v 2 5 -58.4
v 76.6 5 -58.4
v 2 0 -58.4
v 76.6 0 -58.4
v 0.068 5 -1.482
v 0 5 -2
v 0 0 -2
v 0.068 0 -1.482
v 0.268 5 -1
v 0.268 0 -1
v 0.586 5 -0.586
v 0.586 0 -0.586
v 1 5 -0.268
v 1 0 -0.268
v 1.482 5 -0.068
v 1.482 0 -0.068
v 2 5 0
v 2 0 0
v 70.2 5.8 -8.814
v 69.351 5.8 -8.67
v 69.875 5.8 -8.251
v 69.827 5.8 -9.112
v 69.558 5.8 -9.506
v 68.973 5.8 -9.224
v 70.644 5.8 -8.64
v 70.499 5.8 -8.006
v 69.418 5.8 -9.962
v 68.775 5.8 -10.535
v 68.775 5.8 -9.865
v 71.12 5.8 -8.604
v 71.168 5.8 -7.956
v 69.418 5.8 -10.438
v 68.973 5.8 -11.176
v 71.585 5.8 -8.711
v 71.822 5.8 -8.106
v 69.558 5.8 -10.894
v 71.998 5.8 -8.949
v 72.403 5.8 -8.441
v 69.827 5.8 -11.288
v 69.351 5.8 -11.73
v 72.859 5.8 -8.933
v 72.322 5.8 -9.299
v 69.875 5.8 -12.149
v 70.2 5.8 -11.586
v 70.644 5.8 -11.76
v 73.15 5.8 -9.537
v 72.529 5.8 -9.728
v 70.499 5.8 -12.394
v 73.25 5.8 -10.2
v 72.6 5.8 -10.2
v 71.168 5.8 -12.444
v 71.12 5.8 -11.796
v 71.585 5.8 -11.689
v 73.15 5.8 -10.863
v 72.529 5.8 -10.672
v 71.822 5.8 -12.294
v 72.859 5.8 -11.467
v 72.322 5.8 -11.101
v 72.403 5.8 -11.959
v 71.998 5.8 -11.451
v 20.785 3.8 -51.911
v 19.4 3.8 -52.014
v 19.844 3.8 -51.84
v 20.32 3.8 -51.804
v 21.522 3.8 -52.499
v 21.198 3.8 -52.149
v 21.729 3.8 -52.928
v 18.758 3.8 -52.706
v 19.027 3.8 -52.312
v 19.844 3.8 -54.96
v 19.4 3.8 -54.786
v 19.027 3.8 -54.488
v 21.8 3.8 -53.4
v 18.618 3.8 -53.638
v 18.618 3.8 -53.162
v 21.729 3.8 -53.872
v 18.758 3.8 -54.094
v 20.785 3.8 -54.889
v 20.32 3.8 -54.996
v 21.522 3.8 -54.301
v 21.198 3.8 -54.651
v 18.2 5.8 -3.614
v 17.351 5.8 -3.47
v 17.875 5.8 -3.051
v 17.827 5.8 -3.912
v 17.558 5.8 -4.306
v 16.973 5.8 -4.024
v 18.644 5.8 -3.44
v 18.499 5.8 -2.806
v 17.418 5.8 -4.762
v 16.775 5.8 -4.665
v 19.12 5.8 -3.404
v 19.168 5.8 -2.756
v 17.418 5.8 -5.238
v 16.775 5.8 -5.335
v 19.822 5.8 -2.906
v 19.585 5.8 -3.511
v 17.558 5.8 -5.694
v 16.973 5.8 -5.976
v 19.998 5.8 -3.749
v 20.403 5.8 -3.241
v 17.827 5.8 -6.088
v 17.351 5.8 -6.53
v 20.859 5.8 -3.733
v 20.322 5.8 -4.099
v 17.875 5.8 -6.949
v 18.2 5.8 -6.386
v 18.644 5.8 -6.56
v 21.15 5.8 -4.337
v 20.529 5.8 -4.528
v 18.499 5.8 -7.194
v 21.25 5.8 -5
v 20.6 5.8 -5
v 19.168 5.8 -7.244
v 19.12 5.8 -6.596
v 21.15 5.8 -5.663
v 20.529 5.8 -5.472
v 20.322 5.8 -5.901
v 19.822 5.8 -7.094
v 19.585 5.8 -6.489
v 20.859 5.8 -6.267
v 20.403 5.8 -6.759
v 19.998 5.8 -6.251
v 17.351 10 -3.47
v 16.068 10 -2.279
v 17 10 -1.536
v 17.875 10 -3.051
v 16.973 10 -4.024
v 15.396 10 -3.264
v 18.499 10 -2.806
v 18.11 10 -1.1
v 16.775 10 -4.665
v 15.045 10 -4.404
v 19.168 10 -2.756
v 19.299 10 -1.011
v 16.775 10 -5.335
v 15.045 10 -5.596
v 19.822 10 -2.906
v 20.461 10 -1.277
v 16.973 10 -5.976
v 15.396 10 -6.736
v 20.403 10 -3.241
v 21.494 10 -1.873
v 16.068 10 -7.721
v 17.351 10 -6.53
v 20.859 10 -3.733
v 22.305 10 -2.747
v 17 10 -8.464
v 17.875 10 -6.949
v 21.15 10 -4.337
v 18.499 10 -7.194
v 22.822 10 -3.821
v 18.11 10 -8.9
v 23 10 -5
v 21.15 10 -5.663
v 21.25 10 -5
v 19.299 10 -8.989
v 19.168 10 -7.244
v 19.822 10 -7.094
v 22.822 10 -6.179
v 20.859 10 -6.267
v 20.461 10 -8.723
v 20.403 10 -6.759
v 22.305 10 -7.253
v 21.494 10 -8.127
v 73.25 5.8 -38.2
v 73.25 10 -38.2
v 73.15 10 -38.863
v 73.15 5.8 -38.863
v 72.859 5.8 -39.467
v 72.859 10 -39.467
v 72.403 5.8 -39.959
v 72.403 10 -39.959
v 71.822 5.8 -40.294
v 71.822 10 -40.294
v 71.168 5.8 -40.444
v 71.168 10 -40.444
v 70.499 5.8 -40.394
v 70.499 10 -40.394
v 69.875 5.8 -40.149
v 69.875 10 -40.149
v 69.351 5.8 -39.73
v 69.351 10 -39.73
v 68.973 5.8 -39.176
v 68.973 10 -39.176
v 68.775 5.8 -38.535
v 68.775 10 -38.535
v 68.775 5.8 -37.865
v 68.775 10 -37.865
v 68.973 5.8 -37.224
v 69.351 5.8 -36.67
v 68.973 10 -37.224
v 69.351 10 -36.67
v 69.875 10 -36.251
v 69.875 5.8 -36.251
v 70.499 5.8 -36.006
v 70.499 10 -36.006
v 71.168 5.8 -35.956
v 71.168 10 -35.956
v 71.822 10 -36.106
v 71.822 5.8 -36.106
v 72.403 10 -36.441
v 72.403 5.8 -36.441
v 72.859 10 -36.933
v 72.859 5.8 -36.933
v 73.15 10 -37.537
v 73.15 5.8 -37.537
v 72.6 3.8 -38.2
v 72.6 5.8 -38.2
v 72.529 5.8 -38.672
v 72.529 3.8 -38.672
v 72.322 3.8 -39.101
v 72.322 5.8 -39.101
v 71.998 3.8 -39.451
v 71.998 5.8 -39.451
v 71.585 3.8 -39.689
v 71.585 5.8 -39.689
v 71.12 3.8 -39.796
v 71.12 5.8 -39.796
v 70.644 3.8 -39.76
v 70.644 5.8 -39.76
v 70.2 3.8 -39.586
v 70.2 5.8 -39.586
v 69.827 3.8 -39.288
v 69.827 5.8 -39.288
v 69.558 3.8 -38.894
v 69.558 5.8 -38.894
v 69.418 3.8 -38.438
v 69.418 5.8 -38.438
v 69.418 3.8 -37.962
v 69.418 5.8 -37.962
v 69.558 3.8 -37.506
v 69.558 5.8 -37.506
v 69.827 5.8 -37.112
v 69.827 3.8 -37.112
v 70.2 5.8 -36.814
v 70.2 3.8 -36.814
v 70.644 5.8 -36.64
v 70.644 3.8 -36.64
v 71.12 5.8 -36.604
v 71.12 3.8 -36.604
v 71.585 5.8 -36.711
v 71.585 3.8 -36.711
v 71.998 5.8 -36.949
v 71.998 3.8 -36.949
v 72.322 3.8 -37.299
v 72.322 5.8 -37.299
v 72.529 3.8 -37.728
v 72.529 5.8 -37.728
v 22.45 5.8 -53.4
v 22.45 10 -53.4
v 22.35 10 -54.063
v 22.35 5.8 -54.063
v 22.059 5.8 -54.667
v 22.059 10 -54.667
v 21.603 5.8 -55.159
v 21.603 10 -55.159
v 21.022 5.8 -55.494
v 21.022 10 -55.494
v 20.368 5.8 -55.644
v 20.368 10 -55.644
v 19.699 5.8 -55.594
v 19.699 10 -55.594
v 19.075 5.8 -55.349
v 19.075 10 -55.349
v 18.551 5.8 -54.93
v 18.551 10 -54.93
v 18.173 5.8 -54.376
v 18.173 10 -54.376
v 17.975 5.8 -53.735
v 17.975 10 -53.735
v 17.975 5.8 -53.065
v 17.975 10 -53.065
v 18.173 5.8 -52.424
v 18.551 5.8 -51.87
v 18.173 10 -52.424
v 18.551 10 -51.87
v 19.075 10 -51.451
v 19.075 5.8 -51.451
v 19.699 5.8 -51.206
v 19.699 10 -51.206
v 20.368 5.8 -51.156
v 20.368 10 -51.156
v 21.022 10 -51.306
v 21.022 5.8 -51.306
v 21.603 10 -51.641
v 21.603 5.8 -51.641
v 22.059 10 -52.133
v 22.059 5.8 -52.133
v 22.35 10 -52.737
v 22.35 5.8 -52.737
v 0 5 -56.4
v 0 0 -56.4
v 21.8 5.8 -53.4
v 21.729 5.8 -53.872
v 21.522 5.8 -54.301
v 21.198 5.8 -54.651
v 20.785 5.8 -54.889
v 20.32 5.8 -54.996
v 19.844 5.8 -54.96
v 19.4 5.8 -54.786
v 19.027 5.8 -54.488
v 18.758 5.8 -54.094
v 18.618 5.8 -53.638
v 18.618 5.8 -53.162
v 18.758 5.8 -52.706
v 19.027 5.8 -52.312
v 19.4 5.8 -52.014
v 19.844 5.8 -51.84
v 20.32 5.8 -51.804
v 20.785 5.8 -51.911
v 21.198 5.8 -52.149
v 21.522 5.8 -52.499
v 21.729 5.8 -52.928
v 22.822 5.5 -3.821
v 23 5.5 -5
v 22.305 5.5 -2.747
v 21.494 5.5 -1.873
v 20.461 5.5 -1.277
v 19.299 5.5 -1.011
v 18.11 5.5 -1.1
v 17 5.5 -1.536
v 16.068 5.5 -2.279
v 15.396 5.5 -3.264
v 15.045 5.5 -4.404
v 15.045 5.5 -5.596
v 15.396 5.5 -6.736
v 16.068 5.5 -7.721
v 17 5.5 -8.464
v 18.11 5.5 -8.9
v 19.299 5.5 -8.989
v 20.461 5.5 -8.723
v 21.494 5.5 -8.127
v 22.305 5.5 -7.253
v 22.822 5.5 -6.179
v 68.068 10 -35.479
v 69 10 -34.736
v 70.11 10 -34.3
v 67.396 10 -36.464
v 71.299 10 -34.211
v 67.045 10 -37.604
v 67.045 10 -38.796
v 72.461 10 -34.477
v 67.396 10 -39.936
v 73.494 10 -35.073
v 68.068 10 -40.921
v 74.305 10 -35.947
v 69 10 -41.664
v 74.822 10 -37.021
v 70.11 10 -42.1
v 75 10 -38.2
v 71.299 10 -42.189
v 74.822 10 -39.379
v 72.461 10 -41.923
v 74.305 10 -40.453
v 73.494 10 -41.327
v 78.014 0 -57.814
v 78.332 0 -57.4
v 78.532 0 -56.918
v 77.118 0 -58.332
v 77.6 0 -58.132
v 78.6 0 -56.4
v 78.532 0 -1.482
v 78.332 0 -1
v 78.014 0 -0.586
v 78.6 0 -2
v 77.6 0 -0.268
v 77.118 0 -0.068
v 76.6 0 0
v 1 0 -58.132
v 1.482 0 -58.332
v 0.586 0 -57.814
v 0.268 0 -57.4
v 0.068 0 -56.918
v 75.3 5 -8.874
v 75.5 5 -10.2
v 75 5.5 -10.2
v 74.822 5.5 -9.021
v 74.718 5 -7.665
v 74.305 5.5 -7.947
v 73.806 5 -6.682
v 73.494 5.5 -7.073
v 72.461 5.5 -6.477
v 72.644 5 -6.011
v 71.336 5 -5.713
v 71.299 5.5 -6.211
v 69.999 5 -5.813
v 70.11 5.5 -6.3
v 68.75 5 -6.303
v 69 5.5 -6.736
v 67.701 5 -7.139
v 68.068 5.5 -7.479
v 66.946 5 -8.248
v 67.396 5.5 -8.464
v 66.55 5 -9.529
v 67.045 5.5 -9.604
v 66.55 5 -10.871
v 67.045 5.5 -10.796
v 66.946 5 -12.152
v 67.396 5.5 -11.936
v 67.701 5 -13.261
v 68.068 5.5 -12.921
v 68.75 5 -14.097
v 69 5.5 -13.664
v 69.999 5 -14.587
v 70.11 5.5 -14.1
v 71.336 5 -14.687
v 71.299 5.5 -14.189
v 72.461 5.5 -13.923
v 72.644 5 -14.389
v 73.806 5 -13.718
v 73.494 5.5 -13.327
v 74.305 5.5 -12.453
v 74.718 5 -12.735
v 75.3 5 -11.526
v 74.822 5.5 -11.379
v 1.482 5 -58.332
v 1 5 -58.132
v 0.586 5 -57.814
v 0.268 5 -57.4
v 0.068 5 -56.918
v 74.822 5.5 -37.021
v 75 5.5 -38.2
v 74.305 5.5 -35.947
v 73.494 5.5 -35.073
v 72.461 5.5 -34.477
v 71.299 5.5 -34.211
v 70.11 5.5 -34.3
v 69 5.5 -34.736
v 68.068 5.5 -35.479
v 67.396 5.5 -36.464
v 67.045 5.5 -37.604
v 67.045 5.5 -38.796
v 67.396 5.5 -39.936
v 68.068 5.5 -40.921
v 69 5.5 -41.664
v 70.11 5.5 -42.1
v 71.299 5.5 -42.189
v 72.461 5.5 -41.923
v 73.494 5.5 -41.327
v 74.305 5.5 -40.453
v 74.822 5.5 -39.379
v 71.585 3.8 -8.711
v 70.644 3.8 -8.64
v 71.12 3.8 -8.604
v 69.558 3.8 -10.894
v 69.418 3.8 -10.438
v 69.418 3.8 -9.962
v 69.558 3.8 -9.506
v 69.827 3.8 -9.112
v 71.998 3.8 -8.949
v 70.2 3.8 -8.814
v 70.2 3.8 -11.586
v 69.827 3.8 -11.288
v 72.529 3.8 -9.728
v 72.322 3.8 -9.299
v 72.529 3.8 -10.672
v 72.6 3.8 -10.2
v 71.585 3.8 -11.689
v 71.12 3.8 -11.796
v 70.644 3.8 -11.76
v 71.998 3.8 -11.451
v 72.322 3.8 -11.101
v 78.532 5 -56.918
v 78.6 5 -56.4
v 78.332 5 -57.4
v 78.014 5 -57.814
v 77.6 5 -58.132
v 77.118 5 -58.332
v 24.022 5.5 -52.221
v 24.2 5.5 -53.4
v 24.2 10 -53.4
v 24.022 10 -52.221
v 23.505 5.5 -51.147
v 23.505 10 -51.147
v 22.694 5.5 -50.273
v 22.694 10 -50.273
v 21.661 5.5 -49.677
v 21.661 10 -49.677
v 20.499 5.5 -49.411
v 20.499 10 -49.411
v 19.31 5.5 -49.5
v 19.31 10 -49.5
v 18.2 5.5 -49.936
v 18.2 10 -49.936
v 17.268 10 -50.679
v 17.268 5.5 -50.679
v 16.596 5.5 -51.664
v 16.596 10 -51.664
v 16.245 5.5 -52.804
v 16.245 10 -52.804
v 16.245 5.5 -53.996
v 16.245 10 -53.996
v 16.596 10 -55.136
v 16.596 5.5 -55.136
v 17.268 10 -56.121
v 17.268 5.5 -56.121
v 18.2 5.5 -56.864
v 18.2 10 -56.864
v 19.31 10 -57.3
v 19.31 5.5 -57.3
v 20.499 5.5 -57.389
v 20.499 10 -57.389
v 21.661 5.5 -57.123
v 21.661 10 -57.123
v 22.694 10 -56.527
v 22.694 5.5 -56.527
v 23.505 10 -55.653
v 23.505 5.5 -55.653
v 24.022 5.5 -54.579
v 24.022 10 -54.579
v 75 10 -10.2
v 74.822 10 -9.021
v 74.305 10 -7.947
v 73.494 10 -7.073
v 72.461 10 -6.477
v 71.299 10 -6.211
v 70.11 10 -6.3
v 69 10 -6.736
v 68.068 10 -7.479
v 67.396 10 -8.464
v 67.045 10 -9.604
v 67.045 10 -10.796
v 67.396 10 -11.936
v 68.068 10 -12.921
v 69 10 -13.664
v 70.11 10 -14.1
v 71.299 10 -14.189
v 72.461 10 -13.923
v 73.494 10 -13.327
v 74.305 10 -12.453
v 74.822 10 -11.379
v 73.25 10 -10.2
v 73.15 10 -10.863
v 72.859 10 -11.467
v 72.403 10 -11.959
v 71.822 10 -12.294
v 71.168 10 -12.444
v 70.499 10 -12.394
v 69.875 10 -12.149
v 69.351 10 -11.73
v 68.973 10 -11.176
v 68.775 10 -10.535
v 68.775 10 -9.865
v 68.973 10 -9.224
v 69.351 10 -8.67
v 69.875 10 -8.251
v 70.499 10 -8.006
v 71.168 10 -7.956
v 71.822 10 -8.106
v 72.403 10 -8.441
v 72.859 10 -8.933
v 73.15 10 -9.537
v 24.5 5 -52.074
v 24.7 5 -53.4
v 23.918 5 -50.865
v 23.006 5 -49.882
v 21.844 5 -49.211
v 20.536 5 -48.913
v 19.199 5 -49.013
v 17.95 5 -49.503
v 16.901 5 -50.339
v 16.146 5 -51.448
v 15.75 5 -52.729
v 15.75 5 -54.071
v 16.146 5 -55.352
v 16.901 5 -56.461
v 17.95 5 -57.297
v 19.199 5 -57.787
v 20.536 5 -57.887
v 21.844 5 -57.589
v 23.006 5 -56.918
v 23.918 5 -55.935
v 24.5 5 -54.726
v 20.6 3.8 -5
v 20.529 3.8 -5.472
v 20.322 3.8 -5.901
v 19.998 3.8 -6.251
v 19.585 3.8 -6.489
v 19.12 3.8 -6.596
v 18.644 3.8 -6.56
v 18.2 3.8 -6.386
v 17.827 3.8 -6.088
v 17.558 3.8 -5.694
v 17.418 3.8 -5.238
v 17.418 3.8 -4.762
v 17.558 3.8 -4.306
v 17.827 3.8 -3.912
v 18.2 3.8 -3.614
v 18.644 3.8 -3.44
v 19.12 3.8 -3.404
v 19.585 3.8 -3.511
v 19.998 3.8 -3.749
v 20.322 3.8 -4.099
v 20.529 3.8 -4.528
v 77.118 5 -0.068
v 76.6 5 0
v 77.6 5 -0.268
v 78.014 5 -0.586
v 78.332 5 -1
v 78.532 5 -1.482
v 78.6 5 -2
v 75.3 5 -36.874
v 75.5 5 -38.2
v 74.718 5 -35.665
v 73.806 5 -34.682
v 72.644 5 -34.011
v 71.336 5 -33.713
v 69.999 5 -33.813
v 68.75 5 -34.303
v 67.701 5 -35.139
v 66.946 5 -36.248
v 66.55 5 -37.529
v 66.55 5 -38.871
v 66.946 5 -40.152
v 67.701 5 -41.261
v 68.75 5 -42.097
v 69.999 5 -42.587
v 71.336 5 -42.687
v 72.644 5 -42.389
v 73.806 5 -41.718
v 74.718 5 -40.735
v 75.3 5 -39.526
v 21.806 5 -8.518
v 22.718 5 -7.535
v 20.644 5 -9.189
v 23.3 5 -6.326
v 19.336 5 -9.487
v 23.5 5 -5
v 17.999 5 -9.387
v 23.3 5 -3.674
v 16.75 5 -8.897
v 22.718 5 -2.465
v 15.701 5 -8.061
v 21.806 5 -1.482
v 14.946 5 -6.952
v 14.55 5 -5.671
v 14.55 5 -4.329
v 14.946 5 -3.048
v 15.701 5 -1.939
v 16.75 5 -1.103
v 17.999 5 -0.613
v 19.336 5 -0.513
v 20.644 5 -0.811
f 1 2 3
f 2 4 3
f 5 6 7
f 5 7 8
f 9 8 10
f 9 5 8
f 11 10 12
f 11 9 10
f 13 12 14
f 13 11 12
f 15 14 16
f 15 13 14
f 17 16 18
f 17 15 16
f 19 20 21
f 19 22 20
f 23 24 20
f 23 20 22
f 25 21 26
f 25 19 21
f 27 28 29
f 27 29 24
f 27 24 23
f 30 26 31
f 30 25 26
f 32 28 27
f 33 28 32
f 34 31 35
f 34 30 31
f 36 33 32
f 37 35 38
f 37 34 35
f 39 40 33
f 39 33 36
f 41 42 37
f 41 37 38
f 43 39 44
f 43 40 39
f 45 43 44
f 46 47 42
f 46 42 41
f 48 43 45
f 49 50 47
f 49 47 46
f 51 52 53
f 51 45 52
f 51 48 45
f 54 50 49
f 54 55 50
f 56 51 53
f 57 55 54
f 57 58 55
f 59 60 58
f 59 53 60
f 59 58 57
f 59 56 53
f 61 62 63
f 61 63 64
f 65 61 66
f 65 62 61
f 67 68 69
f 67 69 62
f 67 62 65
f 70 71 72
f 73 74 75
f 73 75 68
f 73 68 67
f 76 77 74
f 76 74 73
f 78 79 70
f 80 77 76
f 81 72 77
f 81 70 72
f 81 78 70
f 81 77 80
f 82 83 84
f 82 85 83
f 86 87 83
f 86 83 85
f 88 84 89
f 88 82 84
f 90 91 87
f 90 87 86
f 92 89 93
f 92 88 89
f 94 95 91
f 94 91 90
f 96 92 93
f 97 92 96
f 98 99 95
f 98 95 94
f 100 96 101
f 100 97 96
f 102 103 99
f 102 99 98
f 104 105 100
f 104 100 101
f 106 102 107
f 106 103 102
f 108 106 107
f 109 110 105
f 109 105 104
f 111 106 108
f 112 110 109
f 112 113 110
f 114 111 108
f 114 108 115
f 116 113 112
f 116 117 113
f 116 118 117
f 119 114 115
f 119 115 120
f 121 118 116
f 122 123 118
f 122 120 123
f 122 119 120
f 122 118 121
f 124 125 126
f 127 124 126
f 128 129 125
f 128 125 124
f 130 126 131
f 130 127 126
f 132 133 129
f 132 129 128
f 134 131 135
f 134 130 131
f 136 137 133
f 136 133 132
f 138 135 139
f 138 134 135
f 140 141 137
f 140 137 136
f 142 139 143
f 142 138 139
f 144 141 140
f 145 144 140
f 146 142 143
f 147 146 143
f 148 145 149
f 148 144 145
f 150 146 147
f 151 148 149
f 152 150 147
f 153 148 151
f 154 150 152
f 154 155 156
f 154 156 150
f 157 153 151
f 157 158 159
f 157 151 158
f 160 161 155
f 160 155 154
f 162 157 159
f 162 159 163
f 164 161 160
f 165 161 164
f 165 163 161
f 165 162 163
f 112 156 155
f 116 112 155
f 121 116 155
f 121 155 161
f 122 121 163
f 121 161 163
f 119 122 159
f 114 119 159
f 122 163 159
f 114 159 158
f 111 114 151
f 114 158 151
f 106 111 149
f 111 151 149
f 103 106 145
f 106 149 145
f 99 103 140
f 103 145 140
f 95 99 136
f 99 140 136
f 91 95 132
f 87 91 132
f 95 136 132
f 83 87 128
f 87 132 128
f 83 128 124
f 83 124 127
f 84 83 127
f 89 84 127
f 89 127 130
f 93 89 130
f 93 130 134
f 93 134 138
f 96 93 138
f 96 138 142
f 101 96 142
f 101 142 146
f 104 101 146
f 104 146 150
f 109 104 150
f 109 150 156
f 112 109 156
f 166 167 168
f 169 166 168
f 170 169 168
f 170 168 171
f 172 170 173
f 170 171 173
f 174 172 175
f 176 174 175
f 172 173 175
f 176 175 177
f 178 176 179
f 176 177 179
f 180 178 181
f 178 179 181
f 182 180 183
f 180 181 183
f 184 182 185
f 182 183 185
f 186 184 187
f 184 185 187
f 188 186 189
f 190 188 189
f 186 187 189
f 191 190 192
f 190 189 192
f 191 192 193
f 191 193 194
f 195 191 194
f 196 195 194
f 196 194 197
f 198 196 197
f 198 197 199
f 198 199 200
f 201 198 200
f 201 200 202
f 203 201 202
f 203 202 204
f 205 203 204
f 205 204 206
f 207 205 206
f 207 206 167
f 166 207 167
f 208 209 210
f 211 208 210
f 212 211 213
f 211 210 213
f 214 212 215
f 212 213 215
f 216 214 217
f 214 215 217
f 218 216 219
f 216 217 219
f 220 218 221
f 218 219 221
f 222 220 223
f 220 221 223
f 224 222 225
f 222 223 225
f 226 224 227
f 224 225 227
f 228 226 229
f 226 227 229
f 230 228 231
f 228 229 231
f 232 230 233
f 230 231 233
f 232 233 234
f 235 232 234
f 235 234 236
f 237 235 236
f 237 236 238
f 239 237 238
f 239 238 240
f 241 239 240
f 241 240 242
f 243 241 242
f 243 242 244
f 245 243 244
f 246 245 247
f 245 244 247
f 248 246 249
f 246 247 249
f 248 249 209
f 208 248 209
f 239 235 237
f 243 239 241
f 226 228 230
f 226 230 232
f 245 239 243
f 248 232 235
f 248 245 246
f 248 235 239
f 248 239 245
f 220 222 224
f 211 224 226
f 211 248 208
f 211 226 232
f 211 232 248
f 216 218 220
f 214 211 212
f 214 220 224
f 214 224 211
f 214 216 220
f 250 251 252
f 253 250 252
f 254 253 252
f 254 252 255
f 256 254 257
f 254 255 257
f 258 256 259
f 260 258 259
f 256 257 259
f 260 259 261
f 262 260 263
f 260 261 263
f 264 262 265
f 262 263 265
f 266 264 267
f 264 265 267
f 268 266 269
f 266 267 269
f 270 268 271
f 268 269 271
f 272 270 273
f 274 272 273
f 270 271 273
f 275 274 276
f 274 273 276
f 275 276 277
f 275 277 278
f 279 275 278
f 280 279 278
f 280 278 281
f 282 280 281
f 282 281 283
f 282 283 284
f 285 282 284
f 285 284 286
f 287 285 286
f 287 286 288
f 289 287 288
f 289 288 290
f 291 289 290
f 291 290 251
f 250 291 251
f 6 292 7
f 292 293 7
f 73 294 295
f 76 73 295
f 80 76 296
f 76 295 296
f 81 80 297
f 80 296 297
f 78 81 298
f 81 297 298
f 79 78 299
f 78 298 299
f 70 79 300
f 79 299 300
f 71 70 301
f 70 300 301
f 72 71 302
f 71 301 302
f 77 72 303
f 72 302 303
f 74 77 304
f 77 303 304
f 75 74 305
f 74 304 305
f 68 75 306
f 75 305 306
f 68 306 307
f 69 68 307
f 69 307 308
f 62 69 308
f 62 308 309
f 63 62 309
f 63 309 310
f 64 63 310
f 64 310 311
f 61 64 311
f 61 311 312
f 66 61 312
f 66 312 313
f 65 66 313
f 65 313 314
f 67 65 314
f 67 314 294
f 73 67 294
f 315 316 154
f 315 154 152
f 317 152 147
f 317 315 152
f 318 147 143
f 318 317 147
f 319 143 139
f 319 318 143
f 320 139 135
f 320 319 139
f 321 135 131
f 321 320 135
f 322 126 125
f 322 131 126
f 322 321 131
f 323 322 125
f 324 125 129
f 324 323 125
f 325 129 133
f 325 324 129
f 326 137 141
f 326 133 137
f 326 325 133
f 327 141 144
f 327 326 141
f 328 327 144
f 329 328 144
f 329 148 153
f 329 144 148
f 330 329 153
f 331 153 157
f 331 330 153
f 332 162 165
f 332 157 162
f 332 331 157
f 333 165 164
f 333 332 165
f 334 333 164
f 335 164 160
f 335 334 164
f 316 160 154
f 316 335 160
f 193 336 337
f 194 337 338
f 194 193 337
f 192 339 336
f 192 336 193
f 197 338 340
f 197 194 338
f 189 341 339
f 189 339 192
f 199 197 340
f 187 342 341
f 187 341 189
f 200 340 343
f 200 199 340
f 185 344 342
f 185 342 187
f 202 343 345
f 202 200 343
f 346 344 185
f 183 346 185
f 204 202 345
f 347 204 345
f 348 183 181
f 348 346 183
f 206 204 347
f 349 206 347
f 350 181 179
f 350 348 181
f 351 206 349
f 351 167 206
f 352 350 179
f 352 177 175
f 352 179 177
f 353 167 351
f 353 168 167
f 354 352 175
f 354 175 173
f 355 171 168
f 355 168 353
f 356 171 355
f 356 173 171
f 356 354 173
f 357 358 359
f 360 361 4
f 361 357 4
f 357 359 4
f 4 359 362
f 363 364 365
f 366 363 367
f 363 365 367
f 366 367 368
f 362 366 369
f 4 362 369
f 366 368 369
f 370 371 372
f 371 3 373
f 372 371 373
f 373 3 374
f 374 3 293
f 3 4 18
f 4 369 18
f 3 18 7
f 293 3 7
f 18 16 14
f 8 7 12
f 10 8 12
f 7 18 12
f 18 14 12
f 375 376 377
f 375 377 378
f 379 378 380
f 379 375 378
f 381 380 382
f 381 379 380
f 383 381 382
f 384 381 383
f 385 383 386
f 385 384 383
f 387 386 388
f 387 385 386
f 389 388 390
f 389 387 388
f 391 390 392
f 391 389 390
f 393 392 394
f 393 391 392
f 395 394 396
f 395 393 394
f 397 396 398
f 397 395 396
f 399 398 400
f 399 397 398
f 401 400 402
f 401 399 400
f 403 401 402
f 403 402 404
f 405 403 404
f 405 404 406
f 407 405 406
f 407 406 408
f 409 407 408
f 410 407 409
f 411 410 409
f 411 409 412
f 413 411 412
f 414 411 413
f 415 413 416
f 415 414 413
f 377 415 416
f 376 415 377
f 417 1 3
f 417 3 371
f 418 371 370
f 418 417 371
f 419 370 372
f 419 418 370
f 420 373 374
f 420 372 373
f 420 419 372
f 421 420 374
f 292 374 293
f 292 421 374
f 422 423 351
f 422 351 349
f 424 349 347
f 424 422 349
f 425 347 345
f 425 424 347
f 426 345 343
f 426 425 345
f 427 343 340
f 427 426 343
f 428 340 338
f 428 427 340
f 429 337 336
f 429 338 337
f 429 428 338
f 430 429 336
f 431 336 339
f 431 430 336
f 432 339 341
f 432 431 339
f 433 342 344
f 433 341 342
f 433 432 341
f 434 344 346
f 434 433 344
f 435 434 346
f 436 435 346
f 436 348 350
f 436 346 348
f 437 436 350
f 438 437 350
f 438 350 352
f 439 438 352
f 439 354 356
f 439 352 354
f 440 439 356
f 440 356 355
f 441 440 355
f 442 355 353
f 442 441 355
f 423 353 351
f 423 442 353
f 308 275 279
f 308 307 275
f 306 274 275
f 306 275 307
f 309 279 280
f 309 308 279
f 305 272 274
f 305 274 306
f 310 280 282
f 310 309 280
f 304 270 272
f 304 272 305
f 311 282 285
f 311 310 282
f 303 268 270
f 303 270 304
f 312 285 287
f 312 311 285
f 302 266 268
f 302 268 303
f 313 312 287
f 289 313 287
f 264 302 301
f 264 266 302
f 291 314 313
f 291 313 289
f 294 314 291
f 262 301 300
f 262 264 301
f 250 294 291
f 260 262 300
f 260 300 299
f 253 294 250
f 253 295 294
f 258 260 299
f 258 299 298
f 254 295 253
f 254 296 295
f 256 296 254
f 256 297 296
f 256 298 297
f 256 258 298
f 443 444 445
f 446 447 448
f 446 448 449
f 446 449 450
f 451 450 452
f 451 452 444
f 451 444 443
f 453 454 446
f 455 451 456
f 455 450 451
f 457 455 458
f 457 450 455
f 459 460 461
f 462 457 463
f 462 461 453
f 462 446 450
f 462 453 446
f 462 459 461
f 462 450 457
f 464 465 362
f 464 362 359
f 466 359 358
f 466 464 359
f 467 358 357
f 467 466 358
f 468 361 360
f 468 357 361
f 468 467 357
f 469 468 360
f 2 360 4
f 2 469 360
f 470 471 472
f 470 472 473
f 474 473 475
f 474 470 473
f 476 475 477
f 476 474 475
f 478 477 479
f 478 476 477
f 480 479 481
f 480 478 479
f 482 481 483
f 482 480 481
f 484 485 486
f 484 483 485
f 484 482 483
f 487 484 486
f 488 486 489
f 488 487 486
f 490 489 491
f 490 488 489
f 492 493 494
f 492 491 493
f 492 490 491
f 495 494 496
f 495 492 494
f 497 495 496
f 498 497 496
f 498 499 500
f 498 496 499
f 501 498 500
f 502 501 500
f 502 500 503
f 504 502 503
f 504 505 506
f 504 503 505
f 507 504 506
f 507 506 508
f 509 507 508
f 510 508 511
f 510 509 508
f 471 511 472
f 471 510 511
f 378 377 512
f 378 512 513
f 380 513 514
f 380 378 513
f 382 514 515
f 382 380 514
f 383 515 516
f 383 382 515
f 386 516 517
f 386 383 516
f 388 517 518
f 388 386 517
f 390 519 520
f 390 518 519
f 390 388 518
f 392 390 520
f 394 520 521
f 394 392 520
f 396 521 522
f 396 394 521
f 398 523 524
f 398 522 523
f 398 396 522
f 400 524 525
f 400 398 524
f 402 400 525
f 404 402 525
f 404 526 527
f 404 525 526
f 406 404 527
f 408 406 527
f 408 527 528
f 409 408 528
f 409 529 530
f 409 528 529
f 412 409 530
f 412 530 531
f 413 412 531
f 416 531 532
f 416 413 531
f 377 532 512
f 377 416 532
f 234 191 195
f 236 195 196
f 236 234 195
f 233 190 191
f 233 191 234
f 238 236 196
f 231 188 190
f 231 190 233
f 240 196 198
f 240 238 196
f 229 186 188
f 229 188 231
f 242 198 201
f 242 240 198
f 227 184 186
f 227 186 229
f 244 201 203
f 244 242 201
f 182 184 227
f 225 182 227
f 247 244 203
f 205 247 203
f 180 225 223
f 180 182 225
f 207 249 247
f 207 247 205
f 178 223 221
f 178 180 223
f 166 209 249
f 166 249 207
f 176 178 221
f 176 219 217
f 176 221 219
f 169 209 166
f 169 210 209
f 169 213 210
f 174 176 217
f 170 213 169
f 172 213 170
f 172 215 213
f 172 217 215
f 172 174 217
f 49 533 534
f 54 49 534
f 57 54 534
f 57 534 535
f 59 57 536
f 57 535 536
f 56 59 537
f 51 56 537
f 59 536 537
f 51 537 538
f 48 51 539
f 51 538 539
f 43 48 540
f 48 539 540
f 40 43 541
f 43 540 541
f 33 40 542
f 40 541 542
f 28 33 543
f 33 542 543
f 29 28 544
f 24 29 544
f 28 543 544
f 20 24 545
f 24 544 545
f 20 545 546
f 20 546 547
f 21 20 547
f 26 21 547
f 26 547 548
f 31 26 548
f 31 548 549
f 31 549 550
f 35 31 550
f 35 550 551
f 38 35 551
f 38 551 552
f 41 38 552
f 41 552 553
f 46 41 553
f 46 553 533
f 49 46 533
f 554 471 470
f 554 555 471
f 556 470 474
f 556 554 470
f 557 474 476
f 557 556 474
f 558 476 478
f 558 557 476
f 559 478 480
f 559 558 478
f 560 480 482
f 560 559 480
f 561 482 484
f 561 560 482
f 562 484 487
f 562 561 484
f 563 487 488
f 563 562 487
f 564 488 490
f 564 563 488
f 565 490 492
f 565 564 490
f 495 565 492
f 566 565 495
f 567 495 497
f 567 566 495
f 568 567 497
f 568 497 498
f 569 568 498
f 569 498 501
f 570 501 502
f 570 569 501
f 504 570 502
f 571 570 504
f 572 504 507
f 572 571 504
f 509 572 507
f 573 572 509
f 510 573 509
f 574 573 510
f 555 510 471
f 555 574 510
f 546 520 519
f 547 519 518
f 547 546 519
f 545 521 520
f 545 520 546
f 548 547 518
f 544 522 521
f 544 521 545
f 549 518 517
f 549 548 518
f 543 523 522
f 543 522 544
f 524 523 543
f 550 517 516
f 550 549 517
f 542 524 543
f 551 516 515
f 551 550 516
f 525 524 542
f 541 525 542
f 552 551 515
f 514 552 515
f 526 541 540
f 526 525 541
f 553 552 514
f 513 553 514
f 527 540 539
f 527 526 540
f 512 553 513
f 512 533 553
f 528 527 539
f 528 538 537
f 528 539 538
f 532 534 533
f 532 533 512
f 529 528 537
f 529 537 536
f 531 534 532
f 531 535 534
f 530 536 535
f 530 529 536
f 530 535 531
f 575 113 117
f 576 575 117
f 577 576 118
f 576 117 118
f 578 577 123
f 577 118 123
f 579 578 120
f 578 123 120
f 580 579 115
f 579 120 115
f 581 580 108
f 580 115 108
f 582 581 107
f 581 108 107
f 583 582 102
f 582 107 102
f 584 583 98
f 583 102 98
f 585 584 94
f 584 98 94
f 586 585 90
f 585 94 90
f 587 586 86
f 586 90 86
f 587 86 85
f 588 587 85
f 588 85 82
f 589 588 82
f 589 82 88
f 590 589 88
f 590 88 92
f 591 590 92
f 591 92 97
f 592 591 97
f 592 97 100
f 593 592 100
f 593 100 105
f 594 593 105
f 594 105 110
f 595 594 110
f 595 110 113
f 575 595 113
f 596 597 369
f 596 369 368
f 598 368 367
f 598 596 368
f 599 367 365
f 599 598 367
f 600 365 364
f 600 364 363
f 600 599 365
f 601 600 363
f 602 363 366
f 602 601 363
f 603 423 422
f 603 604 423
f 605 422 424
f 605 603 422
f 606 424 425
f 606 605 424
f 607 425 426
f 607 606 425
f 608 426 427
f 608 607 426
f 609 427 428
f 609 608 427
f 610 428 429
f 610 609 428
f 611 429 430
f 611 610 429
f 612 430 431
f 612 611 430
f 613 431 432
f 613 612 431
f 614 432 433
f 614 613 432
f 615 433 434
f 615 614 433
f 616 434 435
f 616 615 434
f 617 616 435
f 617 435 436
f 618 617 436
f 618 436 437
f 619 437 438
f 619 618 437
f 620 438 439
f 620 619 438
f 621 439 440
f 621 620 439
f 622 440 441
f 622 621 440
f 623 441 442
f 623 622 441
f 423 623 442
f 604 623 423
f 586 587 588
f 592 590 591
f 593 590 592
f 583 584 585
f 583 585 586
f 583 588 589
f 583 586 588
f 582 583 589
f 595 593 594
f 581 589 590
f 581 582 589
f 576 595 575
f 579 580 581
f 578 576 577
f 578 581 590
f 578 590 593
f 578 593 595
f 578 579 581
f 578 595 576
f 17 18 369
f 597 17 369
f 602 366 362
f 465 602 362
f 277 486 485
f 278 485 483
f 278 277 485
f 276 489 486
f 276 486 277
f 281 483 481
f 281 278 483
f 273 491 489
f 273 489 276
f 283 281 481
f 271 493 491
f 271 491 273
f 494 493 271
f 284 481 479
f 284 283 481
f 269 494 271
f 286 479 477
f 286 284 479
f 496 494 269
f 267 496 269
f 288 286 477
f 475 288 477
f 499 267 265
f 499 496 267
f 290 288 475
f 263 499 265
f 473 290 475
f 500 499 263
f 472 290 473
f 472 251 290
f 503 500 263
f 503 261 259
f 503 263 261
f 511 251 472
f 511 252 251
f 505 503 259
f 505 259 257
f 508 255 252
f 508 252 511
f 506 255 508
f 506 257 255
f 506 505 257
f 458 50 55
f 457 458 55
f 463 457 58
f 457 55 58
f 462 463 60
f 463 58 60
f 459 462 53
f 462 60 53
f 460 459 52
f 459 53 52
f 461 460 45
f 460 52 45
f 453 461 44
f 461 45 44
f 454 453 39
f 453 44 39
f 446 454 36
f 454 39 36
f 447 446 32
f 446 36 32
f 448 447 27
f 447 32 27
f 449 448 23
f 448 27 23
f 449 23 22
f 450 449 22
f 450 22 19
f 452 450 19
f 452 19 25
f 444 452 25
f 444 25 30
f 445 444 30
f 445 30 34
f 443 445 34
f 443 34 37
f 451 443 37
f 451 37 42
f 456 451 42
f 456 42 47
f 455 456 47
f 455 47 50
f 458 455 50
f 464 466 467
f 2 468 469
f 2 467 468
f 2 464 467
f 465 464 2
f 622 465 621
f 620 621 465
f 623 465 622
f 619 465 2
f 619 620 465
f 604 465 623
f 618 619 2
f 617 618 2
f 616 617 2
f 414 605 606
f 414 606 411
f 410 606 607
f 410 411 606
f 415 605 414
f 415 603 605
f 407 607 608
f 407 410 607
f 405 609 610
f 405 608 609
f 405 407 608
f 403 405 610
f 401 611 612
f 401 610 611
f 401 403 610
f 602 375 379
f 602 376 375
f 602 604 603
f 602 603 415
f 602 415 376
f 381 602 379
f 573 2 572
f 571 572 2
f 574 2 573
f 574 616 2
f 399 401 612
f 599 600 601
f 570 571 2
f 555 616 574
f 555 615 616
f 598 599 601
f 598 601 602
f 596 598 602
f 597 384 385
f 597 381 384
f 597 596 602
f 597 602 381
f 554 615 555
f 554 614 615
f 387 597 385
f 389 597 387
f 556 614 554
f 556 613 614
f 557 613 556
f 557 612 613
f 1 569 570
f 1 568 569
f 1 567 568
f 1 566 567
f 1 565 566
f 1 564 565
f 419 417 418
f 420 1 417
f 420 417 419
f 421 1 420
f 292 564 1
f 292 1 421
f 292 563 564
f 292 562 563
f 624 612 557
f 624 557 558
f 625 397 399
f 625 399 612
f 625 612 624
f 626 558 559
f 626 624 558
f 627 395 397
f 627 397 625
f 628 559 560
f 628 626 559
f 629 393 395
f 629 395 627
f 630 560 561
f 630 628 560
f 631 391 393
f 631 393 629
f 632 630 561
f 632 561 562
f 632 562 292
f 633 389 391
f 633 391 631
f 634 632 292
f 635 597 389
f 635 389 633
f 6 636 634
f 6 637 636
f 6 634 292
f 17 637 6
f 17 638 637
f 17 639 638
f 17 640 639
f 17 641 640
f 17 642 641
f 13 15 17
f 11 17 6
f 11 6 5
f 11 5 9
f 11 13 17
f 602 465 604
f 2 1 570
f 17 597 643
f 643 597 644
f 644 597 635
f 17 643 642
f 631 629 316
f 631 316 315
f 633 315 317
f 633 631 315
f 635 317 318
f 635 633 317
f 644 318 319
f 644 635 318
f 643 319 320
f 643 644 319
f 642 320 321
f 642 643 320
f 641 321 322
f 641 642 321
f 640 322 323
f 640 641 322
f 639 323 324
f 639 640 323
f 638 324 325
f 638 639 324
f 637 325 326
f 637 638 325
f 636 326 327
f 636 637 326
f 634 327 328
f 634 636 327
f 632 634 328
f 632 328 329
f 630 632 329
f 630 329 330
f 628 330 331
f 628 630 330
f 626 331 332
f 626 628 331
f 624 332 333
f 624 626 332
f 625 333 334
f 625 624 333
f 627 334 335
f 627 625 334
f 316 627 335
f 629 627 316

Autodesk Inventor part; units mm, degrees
ref_plane "YZ Plane" through (0, 0, 0) normal (1, 0, 0) x (0, 1, 0)
ref_plane "XZ Plane" through (0, 0, 0) normal (0, 1, 0) x (-1, 0, 0)
ref_plane "XY Plane" through (0, 0, 0) normal (0, 0, 1) x (1, 0, 0)
sketch "Sketch1" plane through (0, 0, 0) normal (0, 1, 0) x (-1, 0, 0)
  line L0 (0, 0) -> (-78.6, 0)
  line L1 (-78.6, 0) -> (-78.6, -58.4)
  line L2 (-78.6, -58.4) -> (0, -58.4)
  line L3 (0, -58.4) -> (0, 0)
  dimension "d0" = 78.6
  dimension "d1" = 58.4
extrude "Extrusion1" add sketch "Sketch1" along normal blind 5
sketch "Sketch2" plane through (0, 5, 0) normal (0, 1, 0) x (1, 0, 0)
  circle A0 centre (19, 5) radius 4
  line L0 (0, 58.4) -> (0, 0) projected
  line L1 (0, 0) -> (78.6, 0) projected
  circle A1 centre (20.2, 53.4) radius 4
  line L2 (78.6, 58.4) -> (0, 58.4) projected
  circle A2 centre (71, 38.2) radius 4
  circle A3 centre (71, 10.2) radius 4
  line L3 (78.6, 0) -> (78.6, 58.4) projected
  dimension "d4" = 8
  dimension "d5" = 19
  dimension "d6" = 5
  dimension "d7" = 8
  dimension "d8" = 20.2
  dimension "d9" = 5
  dimension "d10" = 8
  dimension "d11" = 8
  dimension "d12" = 20.2
  dimension "d13" = 7.6
  dimension "d14" = 7.6
  dimension "d15" = 28
extrude "Extrusion2" add sketch "Sketch2" along normal blind 5 contours A0 | A1 | A2 | A3
sketch "Sketch3" plane through (20.2, 10, -53.4) normal (0, 1, 0) x (1, 0, 0)
  circle A0 centre (50.8, -15.2) radius 4 projected
  circle A1 centre (0, 0) radius 4 projected
  circle A2 centre (-1.2, -48.4) radius 4 projected
  circle A3 centre (50.8, -43.2) radius 4 projected
  circle A4 centre (0, 0) radius 2.25
  circle A5 centre (50.8, -15.2) radius 2.25
  circle A6 centre (-1.2, -48.4) radius 2.25
  circle A7 centre (50.8, -43.2) radius 2.25
  point P0 (-20.2, -53.4)
  dimension "d18" = 4.5
  dimension "d19" = 4.5
  dimension "d20" = 4.5
  dimension "d21" = 4.5
extrude "Extrusion3" cut sketch "Sketch3" against normal blind 4.2 contours A4 | A5 | A6 | A7
sketch "Sketch4" plane through (20.2, 5.8, -53.4) normal (0, 1, 0) x (1, 0, 0)
  circle A0 centre (0, 0) radius 2.25 projected
  circle A1 centre (50.8, -15.2) radius 2.25 projected
  circle A2 centre (50.8, -43.2) radius 2.25 projected
  circle A3 centre (-1.2, -48.4) radius 2.25 projected
  circle A4 centre (0, 0) radius 1.6
  circle A5 centre (50.8, -15.2) radius 1.6
  circle A6 centre (50.8, -43.2) radius 1.6
  circle A7 centre (-1.2, -48.4) radius 1.6
  point P0 (-20.2, -53.4)
  dimension "d24" = 3.2
  dimension "d25" = 3.2
  dimension "d26" = 3.2
  dimension "d27" = 3.2
extrude "Extrusion4" cut sketch "Sketch4" against normal blind 2 contours A4 | A5 | A6 | A7
chamfer "Chamfer1" distance 0.5 angle 45 4 edges at (16.2, 5, -53.4) (15, 5, -5) (67, 5, -10.2) (67, 5, -38.2)
fillet "Fillet1" radius 2 4 edges at (0, 2.5, -58.4) (0, 2.5, 0) (78.6, 2.5, 0) (78.6, 2.5, -58.4)
properties part number "Leonardo_Backplate"
